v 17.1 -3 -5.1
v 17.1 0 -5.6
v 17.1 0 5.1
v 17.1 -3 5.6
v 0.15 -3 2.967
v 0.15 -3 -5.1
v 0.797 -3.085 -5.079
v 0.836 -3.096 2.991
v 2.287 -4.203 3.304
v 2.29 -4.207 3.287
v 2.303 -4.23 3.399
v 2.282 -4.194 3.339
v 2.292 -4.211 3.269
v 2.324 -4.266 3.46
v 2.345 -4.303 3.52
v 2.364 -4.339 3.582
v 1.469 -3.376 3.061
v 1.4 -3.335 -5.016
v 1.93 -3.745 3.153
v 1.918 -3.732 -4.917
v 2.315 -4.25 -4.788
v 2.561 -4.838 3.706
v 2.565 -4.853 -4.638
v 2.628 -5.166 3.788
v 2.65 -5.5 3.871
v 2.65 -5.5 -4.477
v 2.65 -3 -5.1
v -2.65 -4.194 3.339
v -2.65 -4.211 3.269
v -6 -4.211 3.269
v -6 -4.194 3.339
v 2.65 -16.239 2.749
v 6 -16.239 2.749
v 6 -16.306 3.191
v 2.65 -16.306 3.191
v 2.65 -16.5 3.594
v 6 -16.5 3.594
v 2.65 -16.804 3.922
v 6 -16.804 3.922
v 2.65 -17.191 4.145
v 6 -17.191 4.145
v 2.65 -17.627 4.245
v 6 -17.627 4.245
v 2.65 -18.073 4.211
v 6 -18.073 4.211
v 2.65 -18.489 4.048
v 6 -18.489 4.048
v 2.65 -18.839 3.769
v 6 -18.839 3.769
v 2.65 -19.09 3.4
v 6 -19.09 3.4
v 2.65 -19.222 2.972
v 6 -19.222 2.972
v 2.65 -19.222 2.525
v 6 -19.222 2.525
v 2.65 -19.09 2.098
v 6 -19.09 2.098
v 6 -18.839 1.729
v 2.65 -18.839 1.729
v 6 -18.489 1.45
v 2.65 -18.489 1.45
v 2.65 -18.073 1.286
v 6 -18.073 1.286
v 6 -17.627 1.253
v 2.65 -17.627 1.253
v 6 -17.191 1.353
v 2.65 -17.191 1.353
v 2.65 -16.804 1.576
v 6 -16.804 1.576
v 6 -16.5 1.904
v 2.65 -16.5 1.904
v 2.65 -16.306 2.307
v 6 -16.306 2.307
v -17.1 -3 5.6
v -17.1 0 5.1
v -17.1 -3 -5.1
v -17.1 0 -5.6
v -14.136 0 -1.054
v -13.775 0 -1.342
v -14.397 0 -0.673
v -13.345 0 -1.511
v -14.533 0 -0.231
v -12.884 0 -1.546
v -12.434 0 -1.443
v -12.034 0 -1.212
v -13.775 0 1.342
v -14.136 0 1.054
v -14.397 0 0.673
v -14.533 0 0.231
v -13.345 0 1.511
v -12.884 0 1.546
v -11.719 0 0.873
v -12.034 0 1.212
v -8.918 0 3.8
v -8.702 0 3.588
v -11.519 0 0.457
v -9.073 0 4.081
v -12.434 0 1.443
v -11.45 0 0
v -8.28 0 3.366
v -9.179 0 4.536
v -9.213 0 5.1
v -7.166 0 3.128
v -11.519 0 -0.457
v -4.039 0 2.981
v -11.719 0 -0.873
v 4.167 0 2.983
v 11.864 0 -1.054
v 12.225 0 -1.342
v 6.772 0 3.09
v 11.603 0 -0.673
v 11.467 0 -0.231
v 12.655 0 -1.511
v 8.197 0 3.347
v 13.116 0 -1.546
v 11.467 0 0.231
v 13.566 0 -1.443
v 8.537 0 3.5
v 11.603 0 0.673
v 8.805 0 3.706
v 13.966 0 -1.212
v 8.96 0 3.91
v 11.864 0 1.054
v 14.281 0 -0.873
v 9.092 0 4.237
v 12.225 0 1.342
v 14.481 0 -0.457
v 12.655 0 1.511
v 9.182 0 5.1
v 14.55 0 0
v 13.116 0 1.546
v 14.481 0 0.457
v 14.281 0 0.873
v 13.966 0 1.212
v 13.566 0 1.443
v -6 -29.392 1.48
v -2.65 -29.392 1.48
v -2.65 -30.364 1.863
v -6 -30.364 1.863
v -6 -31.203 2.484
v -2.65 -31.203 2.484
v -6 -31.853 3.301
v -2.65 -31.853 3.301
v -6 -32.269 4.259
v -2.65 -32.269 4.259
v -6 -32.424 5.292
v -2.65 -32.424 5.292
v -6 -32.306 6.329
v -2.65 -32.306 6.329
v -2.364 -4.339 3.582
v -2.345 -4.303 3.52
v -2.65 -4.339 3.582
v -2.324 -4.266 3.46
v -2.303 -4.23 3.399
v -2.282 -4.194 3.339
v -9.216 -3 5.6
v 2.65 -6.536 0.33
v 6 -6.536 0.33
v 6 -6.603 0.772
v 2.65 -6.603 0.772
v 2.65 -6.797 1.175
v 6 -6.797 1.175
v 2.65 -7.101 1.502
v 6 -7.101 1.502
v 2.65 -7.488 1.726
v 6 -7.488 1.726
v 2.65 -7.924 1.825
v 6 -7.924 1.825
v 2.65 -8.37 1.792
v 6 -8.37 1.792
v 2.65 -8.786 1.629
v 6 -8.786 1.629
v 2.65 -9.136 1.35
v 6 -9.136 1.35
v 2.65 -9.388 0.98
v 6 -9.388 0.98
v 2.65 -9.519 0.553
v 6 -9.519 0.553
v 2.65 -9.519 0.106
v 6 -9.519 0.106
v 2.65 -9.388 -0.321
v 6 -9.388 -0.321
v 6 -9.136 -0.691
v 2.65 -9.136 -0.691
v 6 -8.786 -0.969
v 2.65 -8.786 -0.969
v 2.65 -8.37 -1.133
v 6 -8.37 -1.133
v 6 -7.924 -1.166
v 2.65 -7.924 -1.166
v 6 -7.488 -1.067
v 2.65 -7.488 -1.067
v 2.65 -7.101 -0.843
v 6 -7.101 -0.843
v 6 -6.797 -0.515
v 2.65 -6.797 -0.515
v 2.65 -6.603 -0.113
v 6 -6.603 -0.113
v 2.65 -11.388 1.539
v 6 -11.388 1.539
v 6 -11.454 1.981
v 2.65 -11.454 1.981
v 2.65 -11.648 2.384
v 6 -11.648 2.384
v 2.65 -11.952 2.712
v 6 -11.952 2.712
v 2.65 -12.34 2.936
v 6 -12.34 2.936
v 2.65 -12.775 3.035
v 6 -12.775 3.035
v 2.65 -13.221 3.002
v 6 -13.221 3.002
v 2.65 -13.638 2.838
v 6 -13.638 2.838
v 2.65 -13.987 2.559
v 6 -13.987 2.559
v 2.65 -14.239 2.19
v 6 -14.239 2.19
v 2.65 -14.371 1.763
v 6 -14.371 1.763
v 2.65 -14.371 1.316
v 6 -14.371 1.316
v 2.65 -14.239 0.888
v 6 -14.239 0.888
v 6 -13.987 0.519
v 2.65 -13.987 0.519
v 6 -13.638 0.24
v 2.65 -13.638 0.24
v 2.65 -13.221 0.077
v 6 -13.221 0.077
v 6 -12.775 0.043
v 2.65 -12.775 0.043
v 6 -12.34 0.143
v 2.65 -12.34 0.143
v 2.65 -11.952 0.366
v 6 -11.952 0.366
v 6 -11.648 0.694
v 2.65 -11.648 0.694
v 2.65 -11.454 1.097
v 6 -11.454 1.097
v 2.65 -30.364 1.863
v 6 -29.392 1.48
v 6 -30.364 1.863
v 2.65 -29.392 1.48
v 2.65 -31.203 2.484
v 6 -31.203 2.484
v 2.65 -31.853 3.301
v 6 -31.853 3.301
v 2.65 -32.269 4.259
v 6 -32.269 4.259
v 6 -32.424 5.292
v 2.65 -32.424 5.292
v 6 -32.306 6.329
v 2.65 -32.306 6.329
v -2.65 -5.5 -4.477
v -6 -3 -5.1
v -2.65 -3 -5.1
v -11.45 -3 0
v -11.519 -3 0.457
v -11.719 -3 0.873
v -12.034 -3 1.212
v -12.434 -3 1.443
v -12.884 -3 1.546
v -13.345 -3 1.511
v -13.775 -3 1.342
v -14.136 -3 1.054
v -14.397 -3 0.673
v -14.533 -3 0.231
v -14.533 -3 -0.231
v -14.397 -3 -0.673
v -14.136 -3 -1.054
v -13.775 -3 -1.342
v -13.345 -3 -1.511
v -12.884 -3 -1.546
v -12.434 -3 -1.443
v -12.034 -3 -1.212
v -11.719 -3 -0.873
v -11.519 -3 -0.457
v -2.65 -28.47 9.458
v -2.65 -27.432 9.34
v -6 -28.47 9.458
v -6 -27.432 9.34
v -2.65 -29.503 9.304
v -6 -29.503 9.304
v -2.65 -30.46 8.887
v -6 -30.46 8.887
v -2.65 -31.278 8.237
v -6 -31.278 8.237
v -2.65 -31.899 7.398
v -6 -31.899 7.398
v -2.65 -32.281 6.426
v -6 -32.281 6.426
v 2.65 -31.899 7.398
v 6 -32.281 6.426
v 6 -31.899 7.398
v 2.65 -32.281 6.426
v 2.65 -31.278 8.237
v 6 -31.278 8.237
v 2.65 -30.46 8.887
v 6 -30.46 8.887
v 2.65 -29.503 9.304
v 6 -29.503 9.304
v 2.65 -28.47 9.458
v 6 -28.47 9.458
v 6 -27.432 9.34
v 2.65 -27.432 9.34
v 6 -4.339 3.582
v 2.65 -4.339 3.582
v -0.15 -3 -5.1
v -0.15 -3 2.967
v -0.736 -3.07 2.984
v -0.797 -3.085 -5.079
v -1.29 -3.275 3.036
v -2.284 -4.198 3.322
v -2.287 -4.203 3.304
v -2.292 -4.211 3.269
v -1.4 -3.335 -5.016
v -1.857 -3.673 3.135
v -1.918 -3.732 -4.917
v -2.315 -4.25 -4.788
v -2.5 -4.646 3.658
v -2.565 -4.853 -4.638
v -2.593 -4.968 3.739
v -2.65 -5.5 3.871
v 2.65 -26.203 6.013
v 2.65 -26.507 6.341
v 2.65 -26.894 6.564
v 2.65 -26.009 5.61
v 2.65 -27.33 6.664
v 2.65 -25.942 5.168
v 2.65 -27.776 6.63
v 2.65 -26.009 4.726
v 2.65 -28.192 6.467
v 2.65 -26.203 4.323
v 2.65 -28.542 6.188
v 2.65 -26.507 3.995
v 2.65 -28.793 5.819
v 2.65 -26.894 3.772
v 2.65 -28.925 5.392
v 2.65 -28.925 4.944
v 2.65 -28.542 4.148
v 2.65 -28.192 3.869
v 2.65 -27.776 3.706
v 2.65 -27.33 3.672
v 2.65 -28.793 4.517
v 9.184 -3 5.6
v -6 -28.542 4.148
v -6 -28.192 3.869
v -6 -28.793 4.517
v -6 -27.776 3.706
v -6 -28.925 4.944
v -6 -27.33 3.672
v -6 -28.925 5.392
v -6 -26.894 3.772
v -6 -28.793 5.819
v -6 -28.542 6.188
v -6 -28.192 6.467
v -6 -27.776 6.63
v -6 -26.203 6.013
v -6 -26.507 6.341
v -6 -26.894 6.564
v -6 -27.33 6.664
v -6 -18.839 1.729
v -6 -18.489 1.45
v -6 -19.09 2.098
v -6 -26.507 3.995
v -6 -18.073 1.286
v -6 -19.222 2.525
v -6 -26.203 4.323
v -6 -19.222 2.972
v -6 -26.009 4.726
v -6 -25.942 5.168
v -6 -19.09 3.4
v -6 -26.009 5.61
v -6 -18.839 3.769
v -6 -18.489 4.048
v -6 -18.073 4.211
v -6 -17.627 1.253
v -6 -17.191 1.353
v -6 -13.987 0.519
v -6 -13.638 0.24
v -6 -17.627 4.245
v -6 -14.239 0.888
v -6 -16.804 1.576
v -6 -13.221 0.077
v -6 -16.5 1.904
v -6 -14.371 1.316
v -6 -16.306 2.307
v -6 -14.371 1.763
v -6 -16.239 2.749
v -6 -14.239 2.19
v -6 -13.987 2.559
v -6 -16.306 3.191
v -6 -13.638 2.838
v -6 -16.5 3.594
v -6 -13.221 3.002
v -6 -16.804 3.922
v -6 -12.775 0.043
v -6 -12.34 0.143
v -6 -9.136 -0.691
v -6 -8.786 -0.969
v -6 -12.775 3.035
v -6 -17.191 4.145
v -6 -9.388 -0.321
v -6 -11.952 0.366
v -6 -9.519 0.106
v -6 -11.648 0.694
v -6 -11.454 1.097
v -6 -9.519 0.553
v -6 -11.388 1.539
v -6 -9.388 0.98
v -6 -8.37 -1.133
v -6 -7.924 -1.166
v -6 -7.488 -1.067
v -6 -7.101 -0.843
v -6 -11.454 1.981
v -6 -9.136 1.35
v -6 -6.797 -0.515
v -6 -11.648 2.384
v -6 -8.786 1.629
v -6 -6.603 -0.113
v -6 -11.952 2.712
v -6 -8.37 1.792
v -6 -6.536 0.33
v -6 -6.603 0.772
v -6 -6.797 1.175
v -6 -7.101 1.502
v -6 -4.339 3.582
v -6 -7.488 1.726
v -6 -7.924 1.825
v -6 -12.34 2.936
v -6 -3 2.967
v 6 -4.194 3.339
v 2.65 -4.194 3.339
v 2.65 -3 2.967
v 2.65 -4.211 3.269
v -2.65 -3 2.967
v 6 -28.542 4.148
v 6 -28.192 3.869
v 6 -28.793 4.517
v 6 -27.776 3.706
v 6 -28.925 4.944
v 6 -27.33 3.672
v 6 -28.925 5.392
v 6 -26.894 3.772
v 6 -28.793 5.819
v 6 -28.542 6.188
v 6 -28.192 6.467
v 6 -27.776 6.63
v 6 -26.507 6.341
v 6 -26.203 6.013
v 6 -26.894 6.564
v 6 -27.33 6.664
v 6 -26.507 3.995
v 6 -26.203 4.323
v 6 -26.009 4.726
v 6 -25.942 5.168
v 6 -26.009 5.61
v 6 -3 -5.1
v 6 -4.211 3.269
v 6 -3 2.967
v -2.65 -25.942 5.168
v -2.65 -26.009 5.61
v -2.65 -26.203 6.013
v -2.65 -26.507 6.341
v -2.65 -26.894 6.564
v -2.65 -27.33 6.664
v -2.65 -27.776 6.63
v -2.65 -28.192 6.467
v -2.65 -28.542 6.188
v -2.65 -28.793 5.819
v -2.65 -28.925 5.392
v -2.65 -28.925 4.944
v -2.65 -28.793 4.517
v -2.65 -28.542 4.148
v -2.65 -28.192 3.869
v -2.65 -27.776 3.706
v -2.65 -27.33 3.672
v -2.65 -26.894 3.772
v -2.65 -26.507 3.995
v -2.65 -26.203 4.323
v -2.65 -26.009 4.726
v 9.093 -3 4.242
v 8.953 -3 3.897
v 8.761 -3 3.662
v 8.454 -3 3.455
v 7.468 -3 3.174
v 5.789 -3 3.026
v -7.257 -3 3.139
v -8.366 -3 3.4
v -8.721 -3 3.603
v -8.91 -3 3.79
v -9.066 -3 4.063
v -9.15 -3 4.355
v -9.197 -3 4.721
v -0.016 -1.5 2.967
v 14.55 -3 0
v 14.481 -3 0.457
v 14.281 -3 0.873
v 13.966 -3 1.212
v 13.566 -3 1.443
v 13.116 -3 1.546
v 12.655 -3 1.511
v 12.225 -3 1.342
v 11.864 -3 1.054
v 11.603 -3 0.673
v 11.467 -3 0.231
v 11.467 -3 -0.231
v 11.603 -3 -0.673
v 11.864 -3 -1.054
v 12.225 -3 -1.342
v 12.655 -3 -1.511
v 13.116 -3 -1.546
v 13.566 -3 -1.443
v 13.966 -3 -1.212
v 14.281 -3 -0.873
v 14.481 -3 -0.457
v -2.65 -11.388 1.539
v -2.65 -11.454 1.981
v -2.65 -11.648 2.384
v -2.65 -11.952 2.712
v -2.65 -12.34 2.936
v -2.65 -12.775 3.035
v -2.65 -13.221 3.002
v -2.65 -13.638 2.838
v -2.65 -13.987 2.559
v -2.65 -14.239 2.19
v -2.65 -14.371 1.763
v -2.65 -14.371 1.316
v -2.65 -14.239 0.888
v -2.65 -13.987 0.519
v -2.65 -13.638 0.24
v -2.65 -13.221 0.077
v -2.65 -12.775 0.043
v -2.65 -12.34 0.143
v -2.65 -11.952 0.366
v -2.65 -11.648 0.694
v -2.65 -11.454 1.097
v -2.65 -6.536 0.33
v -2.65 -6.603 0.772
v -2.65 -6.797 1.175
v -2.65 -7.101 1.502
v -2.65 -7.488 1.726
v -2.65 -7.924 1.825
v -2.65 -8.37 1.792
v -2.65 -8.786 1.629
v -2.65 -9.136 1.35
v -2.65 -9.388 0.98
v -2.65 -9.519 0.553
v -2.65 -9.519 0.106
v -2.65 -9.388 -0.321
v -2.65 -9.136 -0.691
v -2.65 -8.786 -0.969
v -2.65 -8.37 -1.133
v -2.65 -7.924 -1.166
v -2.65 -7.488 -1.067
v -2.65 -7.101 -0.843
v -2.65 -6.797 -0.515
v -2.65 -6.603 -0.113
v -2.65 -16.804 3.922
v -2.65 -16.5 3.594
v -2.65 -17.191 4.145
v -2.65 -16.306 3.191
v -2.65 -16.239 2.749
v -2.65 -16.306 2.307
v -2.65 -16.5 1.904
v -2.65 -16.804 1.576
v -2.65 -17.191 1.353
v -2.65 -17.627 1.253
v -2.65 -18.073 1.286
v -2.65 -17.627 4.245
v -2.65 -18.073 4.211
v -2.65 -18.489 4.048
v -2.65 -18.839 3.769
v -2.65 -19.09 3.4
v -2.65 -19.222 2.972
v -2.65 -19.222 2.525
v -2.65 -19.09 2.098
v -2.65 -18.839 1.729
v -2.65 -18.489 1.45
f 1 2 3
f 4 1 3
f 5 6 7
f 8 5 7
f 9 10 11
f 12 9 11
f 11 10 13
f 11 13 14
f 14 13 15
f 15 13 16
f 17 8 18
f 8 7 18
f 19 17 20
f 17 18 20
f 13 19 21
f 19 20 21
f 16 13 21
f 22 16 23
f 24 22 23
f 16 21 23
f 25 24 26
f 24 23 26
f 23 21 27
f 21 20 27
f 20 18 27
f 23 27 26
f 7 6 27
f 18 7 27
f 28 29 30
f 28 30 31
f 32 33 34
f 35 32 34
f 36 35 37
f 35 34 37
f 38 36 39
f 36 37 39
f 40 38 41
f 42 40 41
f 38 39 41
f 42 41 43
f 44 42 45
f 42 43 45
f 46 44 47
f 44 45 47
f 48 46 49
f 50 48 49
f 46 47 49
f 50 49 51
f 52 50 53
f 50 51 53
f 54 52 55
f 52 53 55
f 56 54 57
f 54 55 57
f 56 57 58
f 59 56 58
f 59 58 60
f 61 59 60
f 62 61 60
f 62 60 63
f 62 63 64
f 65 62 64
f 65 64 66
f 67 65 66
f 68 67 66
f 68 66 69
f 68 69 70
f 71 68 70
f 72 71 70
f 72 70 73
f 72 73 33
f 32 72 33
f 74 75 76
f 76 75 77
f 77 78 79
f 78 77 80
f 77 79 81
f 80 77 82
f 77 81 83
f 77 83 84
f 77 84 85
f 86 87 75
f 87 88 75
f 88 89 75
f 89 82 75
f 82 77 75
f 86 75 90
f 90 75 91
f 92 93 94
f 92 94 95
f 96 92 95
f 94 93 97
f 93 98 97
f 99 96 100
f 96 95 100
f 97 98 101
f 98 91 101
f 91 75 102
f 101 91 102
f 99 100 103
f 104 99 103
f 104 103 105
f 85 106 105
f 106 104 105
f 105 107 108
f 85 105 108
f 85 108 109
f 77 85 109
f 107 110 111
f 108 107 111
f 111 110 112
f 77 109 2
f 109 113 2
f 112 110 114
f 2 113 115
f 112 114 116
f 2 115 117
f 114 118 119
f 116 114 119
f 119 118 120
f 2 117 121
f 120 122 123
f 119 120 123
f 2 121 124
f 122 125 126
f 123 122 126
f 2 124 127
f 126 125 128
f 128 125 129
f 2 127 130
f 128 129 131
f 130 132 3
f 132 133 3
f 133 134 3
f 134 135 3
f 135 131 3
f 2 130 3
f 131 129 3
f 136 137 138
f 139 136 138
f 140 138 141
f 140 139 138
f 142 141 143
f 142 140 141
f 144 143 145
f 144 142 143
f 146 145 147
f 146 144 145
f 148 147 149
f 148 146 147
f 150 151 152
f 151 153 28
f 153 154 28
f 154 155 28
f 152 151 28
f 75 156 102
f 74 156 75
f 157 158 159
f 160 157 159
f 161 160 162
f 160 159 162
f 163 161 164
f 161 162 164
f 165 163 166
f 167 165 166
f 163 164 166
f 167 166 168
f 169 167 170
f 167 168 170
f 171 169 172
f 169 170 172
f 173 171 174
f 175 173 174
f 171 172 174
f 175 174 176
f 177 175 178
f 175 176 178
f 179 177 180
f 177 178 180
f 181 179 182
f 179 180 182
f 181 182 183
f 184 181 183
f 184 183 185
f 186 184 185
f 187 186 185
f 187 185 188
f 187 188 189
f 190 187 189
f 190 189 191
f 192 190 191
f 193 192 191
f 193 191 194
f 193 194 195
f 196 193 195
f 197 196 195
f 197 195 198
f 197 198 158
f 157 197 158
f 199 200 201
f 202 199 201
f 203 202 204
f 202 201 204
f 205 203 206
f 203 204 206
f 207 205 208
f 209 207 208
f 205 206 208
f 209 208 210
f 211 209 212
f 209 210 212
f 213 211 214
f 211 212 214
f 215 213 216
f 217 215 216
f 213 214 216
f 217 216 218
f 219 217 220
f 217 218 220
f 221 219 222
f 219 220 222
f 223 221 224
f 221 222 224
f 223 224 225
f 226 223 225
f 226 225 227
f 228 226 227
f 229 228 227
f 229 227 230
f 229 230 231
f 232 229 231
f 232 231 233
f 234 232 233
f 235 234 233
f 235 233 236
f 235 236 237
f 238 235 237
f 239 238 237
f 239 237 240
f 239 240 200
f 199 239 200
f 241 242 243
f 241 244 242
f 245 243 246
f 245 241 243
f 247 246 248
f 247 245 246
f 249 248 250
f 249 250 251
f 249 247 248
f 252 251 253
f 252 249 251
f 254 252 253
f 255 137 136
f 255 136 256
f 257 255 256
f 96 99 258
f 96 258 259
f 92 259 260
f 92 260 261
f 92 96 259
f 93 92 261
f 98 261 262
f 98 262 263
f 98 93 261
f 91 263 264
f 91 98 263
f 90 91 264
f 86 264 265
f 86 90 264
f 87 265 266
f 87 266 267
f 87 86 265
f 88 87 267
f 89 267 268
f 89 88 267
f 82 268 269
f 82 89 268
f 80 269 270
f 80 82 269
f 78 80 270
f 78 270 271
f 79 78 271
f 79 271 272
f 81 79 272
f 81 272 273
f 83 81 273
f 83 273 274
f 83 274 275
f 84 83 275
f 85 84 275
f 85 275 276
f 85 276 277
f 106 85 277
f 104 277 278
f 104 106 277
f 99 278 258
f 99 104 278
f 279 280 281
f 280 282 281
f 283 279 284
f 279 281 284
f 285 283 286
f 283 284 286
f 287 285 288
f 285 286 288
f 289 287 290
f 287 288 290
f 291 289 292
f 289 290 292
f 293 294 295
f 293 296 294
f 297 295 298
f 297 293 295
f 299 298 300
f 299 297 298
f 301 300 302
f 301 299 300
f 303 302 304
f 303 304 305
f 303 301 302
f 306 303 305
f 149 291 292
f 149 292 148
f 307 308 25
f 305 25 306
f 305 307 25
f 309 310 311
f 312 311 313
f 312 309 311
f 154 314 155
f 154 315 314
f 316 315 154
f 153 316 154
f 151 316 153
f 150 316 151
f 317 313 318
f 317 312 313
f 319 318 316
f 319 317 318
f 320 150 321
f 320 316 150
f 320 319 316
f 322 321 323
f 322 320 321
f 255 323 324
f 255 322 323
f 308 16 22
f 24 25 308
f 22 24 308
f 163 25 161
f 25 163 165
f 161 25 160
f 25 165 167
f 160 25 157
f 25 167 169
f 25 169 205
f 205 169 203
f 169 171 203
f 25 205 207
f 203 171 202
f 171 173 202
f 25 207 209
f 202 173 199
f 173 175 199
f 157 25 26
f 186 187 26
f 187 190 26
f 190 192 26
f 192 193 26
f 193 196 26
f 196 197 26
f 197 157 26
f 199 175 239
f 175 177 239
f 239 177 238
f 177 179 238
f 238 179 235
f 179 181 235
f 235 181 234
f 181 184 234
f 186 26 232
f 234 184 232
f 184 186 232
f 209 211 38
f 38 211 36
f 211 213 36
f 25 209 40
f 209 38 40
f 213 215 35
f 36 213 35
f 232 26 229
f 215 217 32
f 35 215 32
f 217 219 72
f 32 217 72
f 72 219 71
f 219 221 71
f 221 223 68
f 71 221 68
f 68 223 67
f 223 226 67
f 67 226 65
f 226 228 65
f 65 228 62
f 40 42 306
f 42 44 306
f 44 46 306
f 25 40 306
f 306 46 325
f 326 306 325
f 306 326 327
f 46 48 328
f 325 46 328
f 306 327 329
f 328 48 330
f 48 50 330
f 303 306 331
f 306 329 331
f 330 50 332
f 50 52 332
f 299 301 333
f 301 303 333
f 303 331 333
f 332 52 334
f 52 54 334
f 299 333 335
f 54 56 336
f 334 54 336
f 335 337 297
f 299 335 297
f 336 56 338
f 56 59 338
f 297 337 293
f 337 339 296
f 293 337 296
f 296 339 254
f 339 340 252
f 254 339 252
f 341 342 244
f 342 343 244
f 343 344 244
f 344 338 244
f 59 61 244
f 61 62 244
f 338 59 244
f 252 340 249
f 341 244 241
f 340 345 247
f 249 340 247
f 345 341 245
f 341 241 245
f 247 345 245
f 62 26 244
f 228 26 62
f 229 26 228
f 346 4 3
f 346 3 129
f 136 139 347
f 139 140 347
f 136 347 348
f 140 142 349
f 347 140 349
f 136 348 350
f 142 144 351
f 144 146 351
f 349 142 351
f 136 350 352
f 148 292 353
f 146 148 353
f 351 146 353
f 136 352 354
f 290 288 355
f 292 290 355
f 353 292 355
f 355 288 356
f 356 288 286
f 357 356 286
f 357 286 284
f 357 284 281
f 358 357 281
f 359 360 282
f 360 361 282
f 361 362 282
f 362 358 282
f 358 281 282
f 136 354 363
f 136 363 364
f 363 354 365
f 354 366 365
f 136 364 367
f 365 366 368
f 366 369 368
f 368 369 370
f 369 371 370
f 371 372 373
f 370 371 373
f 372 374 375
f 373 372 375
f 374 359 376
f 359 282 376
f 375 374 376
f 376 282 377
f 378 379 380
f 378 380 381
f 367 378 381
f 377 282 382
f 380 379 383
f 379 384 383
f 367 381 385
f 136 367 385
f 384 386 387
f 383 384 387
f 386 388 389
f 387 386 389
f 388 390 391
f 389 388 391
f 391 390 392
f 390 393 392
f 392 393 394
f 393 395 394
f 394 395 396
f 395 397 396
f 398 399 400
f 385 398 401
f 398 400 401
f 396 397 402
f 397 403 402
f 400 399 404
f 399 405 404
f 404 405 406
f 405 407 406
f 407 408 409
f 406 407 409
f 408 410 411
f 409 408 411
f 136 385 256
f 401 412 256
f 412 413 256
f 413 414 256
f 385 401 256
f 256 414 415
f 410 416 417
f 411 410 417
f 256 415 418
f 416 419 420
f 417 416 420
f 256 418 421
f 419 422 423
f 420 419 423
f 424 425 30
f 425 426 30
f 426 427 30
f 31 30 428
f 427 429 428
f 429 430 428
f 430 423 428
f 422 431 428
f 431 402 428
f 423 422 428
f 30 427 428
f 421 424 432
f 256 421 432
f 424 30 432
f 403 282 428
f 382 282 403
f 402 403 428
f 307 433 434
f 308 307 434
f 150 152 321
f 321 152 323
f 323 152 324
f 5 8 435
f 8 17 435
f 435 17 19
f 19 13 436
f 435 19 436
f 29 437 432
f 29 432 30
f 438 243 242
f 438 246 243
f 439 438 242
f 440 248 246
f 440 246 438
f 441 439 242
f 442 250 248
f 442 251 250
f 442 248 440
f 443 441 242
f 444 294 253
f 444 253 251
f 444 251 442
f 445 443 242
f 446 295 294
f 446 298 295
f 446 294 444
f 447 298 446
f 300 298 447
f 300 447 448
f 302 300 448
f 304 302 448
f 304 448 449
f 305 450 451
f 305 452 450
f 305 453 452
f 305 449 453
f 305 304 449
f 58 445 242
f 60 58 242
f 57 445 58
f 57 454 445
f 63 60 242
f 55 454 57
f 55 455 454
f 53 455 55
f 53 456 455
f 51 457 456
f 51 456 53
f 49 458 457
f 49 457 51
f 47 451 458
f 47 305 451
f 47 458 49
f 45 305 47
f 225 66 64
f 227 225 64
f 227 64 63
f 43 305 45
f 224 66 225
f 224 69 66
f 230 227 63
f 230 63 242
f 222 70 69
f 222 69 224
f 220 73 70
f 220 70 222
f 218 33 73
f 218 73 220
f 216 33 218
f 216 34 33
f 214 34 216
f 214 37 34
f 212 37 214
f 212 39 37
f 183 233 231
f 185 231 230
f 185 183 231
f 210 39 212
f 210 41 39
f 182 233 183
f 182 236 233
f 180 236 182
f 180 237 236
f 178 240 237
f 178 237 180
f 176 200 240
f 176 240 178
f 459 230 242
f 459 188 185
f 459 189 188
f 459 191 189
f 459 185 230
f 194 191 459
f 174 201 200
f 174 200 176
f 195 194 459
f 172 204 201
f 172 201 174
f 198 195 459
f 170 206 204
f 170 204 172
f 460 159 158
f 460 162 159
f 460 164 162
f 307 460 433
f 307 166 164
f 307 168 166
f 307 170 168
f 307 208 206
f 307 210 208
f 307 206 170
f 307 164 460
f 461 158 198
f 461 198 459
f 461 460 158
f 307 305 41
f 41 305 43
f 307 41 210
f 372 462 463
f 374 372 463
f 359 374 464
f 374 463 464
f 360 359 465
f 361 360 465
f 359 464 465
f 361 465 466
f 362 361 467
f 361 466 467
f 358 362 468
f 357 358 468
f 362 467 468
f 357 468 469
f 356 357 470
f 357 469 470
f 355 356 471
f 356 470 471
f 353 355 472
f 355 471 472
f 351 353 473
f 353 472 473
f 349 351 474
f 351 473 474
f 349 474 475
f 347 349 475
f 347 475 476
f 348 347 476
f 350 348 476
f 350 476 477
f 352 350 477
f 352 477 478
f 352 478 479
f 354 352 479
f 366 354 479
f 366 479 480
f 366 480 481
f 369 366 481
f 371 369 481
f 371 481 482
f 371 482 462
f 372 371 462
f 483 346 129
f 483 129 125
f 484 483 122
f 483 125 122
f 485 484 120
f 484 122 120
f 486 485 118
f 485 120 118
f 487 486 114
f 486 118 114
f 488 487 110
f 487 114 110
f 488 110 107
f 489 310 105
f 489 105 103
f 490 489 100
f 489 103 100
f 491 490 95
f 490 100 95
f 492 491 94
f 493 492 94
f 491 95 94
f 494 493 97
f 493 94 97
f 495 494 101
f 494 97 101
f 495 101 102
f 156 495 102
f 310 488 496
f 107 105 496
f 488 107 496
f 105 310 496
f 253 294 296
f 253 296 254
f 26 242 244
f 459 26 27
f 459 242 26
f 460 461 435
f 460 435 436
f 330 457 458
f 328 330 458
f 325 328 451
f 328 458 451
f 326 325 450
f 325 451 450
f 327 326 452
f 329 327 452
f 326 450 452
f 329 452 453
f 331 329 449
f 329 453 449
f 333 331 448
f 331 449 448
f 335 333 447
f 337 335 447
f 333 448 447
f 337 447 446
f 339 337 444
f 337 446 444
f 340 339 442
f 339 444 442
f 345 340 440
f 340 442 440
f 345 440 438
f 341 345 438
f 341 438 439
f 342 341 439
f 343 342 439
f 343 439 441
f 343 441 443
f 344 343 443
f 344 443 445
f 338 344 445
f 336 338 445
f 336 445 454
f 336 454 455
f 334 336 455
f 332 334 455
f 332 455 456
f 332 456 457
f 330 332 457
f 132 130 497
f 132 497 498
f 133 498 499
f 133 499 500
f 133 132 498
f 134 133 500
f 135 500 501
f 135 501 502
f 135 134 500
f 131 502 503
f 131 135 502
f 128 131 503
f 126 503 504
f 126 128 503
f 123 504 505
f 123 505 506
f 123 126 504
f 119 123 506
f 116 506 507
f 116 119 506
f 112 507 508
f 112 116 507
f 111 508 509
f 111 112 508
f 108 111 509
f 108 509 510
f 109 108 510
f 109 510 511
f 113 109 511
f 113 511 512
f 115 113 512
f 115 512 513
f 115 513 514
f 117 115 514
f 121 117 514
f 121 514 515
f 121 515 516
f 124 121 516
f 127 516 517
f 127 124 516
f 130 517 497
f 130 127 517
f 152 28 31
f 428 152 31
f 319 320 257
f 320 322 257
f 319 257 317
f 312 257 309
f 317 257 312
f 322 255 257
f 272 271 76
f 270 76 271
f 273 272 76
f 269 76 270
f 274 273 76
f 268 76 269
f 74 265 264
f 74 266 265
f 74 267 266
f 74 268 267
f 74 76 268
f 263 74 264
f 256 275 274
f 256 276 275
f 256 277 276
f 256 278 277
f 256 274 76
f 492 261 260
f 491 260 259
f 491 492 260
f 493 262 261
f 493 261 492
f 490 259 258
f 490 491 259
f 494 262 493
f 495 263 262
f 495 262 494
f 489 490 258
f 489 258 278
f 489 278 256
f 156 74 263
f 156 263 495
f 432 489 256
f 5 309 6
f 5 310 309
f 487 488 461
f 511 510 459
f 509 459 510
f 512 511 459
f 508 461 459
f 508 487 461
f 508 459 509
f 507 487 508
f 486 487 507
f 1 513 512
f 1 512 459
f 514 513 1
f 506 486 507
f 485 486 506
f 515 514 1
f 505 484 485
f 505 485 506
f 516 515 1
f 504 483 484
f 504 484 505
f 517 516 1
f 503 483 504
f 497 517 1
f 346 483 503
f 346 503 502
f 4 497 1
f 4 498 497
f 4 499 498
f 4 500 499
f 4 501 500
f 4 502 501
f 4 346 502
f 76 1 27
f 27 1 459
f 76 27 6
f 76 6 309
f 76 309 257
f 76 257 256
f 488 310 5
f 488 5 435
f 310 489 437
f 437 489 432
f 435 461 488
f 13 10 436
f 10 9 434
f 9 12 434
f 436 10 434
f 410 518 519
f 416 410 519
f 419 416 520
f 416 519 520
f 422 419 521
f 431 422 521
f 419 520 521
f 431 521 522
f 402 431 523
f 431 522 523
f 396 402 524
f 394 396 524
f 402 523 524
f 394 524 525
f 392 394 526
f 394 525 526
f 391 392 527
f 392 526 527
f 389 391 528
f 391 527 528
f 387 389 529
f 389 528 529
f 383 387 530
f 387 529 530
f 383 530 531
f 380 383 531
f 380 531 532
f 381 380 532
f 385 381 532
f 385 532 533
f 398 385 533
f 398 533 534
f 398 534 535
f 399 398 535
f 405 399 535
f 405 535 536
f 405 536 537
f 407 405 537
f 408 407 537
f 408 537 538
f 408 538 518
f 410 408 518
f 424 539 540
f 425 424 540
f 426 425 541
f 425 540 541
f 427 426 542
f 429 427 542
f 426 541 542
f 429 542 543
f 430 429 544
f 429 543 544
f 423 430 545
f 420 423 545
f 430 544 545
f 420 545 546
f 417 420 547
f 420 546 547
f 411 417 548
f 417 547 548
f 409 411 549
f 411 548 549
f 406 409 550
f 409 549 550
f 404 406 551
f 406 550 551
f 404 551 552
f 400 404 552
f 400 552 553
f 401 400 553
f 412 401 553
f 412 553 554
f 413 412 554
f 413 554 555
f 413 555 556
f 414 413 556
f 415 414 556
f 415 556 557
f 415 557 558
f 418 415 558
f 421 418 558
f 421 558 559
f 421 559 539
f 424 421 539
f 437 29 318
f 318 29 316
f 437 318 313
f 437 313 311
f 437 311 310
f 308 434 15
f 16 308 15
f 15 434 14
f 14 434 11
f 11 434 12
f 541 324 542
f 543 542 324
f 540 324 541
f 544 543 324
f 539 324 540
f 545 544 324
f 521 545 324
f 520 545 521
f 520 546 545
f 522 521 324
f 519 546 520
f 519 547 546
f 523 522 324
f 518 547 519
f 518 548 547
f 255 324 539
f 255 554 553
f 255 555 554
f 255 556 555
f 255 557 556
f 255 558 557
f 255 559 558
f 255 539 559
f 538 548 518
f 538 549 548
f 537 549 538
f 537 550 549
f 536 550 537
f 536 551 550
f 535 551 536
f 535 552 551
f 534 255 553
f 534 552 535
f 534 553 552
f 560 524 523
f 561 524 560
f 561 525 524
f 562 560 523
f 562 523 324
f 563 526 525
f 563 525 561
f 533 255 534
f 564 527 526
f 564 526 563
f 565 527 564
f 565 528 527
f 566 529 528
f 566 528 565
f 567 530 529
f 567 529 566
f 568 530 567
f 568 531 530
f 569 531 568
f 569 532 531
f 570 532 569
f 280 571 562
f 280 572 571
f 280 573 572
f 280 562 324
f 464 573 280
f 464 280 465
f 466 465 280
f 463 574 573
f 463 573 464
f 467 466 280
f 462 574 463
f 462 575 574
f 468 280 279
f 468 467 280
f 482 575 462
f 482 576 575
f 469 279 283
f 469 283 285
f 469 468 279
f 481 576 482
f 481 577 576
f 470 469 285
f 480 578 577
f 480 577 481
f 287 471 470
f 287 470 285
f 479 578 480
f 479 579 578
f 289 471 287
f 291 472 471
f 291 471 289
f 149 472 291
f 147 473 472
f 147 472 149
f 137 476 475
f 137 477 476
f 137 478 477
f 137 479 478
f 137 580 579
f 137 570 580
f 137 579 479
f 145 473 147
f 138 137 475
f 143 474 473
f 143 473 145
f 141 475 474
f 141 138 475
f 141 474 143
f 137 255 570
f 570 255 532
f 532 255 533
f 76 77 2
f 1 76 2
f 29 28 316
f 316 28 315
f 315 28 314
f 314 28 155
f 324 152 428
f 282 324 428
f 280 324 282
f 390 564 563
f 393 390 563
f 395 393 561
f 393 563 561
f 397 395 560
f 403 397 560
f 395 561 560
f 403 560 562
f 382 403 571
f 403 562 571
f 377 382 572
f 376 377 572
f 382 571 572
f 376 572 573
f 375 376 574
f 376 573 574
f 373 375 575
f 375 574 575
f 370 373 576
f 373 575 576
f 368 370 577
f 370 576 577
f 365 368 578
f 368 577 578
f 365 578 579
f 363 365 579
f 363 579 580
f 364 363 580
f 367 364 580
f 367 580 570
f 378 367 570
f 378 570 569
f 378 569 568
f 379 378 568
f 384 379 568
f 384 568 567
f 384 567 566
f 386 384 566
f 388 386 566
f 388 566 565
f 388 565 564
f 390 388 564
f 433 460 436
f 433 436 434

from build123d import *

# Parameters (mm, degrees)
F0_R          = 1.55
F1_DEPTH      = 3
F2_SIZE2      = 2.99999
F2_SIZE       = 0.49999
F2_2_SIZE2    = 2.99999
F2_2_SIZE     = 0.49999
F4_DEPTH      = 6
F5_DEPTH      = 6
F6_R          = 1.5
F7_DEPTH      = 25
F9_W          = 5.3
F9_H          = 30.2732266598
F10_DEPTH     = 25
F11_R         = 4
F12_T4_DEPTH  = 20.5670004785
F12_T10_DEPTH = 20.5670004785
F12_T16_DEPTH = 20.5670004785
F12_T22_DEPTH = 20.5670004785
F13_SIZE      = 0.2


# Not quite as in the source:
# - a fillet or chamfer that OpenCascade refuses, or shapes differently, is made with other operations: its cross-section is extruded or revolved along the edge and cut away or added
# - a fillet or chamfer is up to 0.001 mm smaller than in the source, because OpenCascade refuses the exact size
# - ends of sketch curves that miss each other by under 0.0002 mm in the source are joined


with BuildPart() as f1:
    # F0 (on Front) → F1 (new body)
    with BuildSketch(Plane.XZ):
        with BuildLine():
            Line((-17.1, 5.6), (-17.1, -5.6))
            Line((-17.1, -5.6), (17.1, -5.6))
            Line((17.1, -5.6), (17.1, 5.6))
            Line((17.1, 5.6), (9.1844569534, 5.6))
            add(Edge.make_bspline(
                [(9.1844569534, 5.6), (9.1844569534, 2.9670004785), (9.1844569534, 2.9670004785), (-0.0155430466, 2.9670004785)],
                knots=[0, 0, 0, 0, 9.5693619495, 9.5693619495, 9.5693619495, 9.5693619495], degree=3))
            add(Edge.make_bspline(
                [(-9.2155430466, 5.6), (-9.2155430466, 2.9670004785), (-9.2155430466, 2.9670004785), (-0.0155430466, 2.9670004785)],
                knots=[0, 0, 0, 0, 9.5693618638, 9.5693618638, 9.5693618638, 9.5693618638], degree=3))
            Line((-9.2155430466, 5.6), (-17.1, 5.6))
        make_face()
        with Locations((-13, 0)):
            Circle(F0_R, mode=Mode.SUBTRACT)
        with Locations((13, 0)):
            Circle(F0_R, mode=Mode.SUBTRACT)
    extrude(amount=F1_DEPTH)

    # F2 (size 0.5 and 3 in the source; OpenCascade refuses exactly that, so slightly less here)
    f2_edges = [f1.edges().sort_by_distance(p)[0] for p in [
        (-13.157772, 0, 5.6),
        (13.142228, 0, 5.6),
    ]]
    f2_side = f1.faces().sort_by_distance((0.002222, 0, -0.619959))[0]
    chamfer(f2_edges, length=F2_SIZE, length2=F2_SIZE2, reference=f2_side)

    # F2#2 (size 0.5 and 3 in the source; OpenCascade refuses exactly that, so slightly less here)
    f2_2_edges = [f1.edges().sort_by_distance(p)[0] for p in [
        (0, -3, -5.6),
    ]]
    f2_2_side = f1.faces().sort_by_distance((0.002222, -3, -0.619959))[0]
    chamfer(f2_2_edges, length=F2_2_SIZE, length2=F2_2_SIZE2, reference=f2_2_side)

    # F3 (on Right) → F4 (join)
    with BuildSketch(Plane.YZ):
        Polygon((-33.2732266598, 2.4479631427), (-3, -5.1), (-3, 2.9670004785), (-4.2113326633, 3.2690196322), (-4.1453789697, 3.5335454488), (-31.3136593055, 10.3073585255), align=None)
    extrude(amount=F4_DEPTH)

    # F5 (add): a face of the model
    f5_faces = [f1.faces().sort_by_distance(p)[0] for p in [
        (0, -17.6712487641, 2.6798726591),
    ]]
    extrude(f5_faces, amount=F5_DEPTH)

    # F6 (on face) → F7 (cut)
    with BuildSketch(Plane.YZ.offset(6)):
        with Locations((-27.4419643513, 5.1680513561)):
            Circle(F6_R)
        with Locations((-17.7390070885, 2.7488324001)):
            Circle(F6_R)
        with Locations((-12.8875284571, 1.5392229221)):
            Circle(F6_R)
        with Locations((-8.0360498257, 0.3296134441)):
            Circle(F6_R)
    extrude(amount=-F7_DEPTH, mode=Mode.SUBTRACT)

    # F9 (on face) → F10 (cut)
    with BuildSketch(Plane(origin=(0, 0, -5.6), x_dir=(1, 0, 0), z_dir=(0, 0, -1))):
        with Locations((0, 18.1366133299)):
            Rectangle(F9_W, F9_H)
    extrude(amount=-F10_DEPTH, mode=Mode.SUBTRACT)

    # F11
    f11_edges = [f1.edges().sort_by_distance(p)[0] for p in [
        (-4.325, -33.273227, 2.447963),
        (4.325, -33.273227, 2.447963),
        (-4.325, -31.313659, 10.307359),
        (4.325, -31.313659, 10.307359),
    ]]
    fillet(f11_edges, radius=F11_R)

    # F12: fillet of radius 2.5 on 2 edges, made by hand


with BuildPart() as f12_tool2:
    # F12_s3 → F12_t4 (new body)
    with BuildSketch(Plane.XY.offset(-11.35)):
        with BuildLine():
            ThreePointArc((-0.15, -3), (-1.917766953, -3.732233047), (-2.65, -5.5))
            Line((-2.65, -5.5), (-2.65, -3))
            Line((-2.65, -3), (-0.15, -3))
        make_face()
    extrude(amount=F12_T4_DEPTH)

    split(bisect_by=Plane(origin=(0, 0.520882565, 2.0891458603), x_dir=(1, 0, 0), z_dir=(0, -0.2419218956, -0.9702957263)), keep=Keep.TOP)

    split(bisect_by=Plane(origin=(0, -1.3727310958, -5.505723706), x_dir=(1, 0, 0), z_dir=(0, 0.2419218956, 0.9702957263)), keep=Keep.TOP)


with BuildPart() as f1_1:
    add(f1.part)

    # F12_t1: union F12_tool2
    add(f12_tool2.part)


with BuildPart() as f12_tool8:
    # F12_s9 → F12_t10 (new body)
    with BuildSketch(Plane.XY.offset(-11.35)):
        with BuildLine():
            ThreePointArc((-0.15, -3), (-1.917766953, -3.732233047), (-2.65, -5.5))
            Line((-2.65, -5.5), (-2.65, -3))
            Line((-2.65, -3), (-0.15, -3))
        make_face()
    extrude(amount=F12_T10_DEPTH)

    split(bisect_by=Plane(origin=(0, -4.7322152283, 1.1798737719), x_dir=(1, 0, 0), z_dir=(0, -0.9702957263, 0.2419218956)), keep=Keep.TOP)

    split(bisect_by=Plane(origin=(0, 0.5868362585, 2.3536716769), x_dir=(1, 0, 0), z_dir=(0, -0.2419218956, -0.9702957263)), keep=Keep.TOP)


with BuildPart() as f1_2:
    add(f1_1.part)

    # F12_t7: union F12_tool8
    add(f12_tool8.part)


with BuildPart() as f12_tool14:
    # F12_s15 → F12_t16 (new body)
    with BuildSketch(Plane.XY.offset(-11.35)):
        with BuildLine():
            ThreePointArc((0.15, -3), (1.917766953, -3.732233047), (2.65, -5.5))
            Line((2.65, -5.5), (2.65, -3))
            Line((2.65, -3), (0.15, -3))
        make_face()
    extrude(amount=F12_T16_DEPTH)

    split(bisect_by=Plane(origin=(0, -1.3727310958, -5.505723706), x_dir=(1, 0, 0), z_dir=(0, 0.2419218956, 0.9702957263)), keep=Keep.TOP)

    split(bisect_by=Plane(origin=(0, 0.520882565, 2.0891458603), x_dir=(1, 0, 0), z_dir=(0, -0.2419218956, -0.9702957263)), keep=Keep.TOP)


with BuildPart() as f1_3:
    add(f1_2.part)

    # F12_t13: union F12_tool14
    add(f12_tool14.part)


with BuildPart() as f12_tool20:
    # F12_s21 → F12_t22 (new body)
    with BuildSketch(Plane.XY.offset(-11.35)):
        with BuildLine():
            ThreePointArc((0.15, -3), (1.917766953, -3.732233047), (2.65, -5.5))
            Line((2.65, -5.5), (2.65, -3))
            Line((2.65, -3), (0.15, -3))
        make_face()
    extrude(amount=F12_T22_DEPTH)

    split(bisect_by=Plane(origin=(0, -4.7322152283, 1.1798737719), x_dir=(1, 0, 0), z_dir=(0, -0.9702957263, 0.2419218956)), keep=Keep.TOP)

    split(bisect_by=Plane(origin=(0, 0.5868362585, 2.3536716769), x_dir=(1, 0, 0), z_dir=(0, -0.2419218956, -0.9702957263)), keep=Keep.TOP)


with BuildPart() as f1_4:
    add(f1_3.part)

    # F12_t19: union F12_tool20
    add(f12_tool20.part)

    # F13
    f13_edges = [f1_4.edges().sort_by_distance(p)[0] for p in [
        (4.125595, -4.145379, 3.533545),
        (-4.125595, -4.145379, 3.533545),
    ]]
    chamfer(f13_edges, length=F13_SIZE)


solid = f1_4.part
